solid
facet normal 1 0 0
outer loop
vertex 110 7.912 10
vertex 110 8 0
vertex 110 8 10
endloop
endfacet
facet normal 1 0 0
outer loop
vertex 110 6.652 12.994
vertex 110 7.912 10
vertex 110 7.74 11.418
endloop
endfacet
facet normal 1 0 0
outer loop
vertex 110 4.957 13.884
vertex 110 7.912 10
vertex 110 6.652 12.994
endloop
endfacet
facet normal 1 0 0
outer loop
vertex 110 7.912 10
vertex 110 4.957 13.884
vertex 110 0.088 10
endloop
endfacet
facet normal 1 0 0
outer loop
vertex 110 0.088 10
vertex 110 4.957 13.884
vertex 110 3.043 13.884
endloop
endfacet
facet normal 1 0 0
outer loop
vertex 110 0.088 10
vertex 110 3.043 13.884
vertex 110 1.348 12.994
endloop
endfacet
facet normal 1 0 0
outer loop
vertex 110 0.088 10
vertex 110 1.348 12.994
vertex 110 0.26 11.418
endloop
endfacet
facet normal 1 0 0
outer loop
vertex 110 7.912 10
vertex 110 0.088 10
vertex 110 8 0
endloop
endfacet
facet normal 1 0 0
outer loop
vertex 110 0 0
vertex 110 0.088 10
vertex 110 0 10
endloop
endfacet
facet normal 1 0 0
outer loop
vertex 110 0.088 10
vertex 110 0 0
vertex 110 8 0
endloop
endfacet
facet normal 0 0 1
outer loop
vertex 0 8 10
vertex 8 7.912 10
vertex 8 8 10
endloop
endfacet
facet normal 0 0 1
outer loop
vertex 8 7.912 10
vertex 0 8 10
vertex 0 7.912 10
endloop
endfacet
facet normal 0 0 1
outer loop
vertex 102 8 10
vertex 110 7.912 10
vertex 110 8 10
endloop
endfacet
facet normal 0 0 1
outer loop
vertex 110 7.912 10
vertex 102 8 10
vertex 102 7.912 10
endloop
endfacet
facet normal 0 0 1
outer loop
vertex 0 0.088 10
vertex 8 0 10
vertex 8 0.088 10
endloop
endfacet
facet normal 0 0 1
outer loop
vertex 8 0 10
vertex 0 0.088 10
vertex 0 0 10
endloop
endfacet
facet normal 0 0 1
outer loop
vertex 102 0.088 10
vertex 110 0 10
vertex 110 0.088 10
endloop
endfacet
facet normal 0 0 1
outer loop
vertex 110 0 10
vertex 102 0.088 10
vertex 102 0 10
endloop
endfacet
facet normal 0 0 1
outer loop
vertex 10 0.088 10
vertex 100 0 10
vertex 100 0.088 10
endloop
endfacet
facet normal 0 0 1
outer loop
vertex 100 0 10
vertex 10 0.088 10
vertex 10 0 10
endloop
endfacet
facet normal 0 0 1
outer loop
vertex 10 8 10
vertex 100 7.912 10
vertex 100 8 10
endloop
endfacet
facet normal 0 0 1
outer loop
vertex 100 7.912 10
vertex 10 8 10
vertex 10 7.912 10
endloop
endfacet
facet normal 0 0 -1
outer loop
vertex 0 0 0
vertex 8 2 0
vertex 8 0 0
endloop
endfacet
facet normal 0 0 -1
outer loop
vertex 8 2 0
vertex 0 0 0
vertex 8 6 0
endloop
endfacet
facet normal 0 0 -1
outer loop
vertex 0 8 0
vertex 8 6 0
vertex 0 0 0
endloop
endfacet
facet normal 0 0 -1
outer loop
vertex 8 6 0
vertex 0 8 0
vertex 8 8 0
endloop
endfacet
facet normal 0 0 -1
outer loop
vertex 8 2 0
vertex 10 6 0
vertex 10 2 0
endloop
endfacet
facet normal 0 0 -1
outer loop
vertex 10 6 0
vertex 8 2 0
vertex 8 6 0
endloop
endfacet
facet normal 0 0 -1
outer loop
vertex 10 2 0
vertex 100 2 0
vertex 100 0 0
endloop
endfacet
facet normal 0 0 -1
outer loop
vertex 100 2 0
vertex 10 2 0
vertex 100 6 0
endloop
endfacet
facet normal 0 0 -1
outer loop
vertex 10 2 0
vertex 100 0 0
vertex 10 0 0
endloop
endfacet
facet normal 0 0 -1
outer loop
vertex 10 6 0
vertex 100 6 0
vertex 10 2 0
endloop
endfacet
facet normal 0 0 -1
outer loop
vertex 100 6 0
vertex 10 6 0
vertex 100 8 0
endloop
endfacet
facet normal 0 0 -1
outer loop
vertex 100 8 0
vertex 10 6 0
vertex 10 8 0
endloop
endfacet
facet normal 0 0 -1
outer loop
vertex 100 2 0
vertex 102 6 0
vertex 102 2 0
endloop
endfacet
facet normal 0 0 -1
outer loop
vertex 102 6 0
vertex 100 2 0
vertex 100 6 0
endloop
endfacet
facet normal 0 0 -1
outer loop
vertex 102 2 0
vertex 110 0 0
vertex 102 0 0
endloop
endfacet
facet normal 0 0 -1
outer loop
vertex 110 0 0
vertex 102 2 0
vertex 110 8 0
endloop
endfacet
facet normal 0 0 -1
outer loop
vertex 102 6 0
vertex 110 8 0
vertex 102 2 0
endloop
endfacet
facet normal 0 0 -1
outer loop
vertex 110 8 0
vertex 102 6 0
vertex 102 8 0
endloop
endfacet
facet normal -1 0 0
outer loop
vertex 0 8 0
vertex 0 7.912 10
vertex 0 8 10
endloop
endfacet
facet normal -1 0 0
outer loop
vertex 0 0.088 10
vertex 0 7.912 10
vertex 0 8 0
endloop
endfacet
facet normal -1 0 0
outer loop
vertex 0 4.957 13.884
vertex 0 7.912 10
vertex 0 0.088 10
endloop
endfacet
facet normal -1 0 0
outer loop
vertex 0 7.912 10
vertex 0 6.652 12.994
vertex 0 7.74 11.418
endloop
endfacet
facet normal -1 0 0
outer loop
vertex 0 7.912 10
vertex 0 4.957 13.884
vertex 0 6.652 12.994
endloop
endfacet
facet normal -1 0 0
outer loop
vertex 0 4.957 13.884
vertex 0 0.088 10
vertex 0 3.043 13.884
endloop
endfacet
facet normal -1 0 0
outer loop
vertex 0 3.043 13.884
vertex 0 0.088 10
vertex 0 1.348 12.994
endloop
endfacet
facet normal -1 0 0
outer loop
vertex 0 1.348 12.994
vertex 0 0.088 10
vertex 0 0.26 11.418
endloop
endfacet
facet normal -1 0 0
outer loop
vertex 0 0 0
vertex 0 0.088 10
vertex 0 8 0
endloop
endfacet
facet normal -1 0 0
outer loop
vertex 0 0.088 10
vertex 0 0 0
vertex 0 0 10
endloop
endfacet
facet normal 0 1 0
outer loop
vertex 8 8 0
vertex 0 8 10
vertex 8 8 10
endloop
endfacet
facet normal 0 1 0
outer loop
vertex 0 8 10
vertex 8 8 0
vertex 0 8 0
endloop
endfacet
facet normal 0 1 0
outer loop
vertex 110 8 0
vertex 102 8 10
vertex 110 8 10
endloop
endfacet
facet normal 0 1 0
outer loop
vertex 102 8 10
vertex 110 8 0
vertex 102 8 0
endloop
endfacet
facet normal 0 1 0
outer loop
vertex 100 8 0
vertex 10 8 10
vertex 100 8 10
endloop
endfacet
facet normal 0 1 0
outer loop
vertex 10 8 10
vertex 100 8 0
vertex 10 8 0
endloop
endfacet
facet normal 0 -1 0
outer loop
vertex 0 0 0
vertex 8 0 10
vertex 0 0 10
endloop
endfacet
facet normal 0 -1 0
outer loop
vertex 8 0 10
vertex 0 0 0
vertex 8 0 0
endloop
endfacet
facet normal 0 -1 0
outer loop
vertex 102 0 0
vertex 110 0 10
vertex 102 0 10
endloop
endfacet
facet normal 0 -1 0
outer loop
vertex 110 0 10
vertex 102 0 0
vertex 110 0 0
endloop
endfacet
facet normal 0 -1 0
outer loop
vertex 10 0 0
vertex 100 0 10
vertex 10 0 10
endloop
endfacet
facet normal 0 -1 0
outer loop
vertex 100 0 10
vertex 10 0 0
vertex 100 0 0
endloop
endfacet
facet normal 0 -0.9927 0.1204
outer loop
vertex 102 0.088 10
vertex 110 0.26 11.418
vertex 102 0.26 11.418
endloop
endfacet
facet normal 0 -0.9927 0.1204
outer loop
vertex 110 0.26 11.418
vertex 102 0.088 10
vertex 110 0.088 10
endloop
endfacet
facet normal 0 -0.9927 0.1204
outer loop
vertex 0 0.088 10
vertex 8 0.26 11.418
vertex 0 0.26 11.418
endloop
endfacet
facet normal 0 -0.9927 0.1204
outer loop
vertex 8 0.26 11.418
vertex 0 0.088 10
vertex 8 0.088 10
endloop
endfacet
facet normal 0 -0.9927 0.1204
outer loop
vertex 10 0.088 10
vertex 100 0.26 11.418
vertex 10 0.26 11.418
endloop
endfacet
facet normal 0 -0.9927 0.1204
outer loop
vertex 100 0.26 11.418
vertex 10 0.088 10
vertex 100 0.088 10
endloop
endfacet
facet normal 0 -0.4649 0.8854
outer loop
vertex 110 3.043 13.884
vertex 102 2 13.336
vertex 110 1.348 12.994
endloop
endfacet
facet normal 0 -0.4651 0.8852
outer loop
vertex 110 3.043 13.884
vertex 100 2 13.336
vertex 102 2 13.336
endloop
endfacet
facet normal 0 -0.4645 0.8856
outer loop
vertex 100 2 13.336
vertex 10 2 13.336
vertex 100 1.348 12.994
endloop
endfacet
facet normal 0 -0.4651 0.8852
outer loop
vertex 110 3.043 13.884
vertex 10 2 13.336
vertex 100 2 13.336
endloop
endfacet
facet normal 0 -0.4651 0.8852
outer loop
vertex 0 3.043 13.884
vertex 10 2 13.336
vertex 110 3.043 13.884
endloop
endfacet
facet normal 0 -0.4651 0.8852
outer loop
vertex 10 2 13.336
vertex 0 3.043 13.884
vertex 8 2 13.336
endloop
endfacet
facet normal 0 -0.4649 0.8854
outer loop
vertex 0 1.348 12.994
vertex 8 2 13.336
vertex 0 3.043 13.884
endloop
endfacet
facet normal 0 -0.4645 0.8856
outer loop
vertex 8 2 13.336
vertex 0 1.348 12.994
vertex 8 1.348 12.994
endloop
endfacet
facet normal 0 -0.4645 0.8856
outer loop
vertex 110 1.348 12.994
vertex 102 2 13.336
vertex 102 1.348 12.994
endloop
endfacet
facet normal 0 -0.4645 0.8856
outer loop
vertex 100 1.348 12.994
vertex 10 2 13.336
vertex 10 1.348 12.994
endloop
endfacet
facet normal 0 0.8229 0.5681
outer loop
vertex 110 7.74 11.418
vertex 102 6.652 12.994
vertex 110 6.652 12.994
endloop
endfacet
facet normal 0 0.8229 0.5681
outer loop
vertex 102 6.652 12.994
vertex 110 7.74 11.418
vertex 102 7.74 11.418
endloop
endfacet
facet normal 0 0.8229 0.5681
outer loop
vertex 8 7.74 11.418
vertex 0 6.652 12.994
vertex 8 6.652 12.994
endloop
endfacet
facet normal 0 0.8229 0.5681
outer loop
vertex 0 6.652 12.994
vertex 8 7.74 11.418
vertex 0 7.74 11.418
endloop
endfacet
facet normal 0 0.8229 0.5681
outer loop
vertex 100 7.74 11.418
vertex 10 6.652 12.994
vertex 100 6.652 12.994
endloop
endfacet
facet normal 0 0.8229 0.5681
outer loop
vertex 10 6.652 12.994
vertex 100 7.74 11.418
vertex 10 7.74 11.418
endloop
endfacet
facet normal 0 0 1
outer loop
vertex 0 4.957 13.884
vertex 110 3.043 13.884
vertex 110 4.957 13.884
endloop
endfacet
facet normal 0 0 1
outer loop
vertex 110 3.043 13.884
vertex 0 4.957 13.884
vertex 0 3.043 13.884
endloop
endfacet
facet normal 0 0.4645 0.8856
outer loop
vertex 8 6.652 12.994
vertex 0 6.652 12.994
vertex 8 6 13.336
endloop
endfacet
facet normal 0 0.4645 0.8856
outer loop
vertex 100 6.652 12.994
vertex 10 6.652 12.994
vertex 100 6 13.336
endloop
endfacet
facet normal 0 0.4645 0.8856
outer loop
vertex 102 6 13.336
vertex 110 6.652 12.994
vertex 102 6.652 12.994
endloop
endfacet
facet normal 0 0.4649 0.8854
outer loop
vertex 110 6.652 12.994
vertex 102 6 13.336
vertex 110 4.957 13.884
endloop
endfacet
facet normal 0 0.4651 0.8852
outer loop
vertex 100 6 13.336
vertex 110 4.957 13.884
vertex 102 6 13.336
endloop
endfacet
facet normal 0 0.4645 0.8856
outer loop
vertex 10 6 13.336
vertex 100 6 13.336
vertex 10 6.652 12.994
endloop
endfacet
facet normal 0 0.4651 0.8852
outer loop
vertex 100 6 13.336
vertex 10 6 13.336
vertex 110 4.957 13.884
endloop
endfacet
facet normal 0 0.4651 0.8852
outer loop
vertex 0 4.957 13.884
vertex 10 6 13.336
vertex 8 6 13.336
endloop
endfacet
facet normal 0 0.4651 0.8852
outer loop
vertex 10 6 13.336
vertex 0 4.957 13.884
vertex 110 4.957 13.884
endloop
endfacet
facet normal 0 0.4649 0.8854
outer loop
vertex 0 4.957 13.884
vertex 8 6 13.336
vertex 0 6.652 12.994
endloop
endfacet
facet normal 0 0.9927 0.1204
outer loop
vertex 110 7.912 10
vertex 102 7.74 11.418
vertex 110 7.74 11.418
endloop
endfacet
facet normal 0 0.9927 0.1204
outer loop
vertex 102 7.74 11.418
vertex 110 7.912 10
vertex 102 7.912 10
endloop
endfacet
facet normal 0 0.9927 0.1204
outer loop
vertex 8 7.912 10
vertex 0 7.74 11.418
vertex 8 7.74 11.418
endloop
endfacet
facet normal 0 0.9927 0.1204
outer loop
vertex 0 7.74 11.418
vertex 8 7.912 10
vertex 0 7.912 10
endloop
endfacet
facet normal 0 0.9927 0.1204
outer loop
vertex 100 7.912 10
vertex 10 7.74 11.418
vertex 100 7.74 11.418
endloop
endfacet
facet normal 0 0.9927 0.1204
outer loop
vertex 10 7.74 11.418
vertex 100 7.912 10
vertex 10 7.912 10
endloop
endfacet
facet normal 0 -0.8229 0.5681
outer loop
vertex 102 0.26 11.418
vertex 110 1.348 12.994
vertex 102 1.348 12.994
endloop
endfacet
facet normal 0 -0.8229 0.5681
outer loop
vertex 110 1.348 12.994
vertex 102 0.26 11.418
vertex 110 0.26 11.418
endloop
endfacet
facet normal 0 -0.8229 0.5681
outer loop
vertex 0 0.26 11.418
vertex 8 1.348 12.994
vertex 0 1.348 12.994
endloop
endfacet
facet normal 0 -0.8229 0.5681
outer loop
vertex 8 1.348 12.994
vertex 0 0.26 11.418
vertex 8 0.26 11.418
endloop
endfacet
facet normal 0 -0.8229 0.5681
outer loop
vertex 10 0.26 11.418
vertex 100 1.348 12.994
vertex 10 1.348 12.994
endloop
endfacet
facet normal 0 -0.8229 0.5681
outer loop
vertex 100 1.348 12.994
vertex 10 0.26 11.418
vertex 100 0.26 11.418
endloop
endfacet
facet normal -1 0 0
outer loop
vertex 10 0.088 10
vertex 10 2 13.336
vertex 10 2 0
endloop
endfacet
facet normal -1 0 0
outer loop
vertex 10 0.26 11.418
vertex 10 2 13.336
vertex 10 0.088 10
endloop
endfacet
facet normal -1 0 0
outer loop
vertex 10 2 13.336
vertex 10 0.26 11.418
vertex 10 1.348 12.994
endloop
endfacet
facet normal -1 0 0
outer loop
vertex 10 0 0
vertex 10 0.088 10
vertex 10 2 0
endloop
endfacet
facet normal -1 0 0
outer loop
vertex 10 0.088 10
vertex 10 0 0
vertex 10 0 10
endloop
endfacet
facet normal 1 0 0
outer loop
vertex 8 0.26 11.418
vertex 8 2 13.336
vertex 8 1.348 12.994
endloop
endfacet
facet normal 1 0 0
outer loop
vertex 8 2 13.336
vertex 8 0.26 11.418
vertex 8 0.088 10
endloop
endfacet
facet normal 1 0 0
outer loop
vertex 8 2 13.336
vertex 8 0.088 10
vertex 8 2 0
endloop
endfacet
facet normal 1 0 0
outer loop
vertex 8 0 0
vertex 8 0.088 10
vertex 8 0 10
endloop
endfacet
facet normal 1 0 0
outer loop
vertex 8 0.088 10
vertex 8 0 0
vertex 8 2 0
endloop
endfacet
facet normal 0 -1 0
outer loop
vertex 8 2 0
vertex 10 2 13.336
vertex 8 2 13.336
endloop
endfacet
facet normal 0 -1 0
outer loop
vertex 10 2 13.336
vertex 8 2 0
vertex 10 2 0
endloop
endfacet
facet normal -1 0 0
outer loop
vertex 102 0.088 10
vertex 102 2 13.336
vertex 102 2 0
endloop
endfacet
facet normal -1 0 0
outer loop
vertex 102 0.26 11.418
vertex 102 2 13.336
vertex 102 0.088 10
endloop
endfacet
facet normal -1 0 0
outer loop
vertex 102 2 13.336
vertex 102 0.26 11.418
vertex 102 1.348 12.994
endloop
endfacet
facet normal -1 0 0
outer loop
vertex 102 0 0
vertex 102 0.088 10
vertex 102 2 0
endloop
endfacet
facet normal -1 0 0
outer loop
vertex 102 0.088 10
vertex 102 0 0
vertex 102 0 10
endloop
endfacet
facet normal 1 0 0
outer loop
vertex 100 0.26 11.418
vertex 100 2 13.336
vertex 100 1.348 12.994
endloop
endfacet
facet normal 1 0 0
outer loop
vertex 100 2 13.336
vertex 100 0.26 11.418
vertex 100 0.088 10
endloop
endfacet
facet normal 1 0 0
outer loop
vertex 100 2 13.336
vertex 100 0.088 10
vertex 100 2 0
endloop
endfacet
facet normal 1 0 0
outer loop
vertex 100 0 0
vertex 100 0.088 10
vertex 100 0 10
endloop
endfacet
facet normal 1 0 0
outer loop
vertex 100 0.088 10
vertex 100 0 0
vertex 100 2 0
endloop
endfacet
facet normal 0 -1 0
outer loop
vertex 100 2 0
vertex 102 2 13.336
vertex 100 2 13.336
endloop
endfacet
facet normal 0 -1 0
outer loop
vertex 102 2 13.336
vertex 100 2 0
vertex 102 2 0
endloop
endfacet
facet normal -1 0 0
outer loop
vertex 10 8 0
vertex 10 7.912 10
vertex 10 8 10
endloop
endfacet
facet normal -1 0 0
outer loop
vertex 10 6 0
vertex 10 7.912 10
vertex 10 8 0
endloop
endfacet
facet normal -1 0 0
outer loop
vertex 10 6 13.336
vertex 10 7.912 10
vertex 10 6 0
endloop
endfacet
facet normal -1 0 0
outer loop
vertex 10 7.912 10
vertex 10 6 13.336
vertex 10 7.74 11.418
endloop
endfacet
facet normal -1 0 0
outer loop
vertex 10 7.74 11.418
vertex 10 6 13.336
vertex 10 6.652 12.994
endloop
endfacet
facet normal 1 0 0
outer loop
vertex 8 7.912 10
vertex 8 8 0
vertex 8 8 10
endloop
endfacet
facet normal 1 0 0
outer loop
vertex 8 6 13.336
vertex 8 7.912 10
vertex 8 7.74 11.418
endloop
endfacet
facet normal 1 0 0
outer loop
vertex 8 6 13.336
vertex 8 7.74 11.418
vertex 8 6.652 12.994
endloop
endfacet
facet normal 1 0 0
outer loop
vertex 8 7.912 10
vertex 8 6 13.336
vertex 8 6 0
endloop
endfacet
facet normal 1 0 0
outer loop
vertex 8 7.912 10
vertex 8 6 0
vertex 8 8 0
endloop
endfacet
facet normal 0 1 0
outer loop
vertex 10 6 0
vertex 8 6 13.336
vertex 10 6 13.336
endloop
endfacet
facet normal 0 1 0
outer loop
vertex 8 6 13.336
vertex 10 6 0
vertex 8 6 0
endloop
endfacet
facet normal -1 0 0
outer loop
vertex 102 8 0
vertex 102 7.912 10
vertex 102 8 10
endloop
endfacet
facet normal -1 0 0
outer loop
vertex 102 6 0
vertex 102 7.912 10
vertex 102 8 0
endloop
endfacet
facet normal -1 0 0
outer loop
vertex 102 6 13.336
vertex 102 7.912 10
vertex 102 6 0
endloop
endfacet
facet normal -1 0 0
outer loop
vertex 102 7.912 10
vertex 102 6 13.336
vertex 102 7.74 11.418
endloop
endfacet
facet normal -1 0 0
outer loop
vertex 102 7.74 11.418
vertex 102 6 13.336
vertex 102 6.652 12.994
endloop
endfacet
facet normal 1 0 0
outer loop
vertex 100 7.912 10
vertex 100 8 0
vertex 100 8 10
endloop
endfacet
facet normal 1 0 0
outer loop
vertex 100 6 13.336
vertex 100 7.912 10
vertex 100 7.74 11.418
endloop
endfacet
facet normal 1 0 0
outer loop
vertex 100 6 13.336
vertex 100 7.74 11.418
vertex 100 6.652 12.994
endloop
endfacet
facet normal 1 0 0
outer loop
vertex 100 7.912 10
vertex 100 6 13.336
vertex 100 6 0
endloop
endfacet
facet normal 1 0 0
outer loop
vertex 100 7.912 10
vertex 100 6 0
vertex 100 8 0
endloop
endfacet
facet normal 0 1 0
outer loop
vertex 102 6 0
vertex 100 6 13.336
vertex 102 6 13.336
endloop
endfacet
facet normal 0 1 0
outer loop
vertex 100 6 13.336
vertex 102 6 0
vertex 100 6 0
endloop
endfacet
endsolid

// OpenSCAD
// Configurator variables

// length of the bar in mm.
bar_length = 110;

// End of configurator variables

/* [Hidden] */

bar_height = 10;
bar_width = 8;
difference()
{
  union()
  {
    cube([bar_length, bar_width, bar_height]);
    translate([0, bar_width/2, bar_height]) rotate([0,90,0]) cylinder(d=bar_width, h=bar_length);
  }
  translate([8,0,0])
    cube([2,2,bar_height+bar_width]);
  translate([bar_length-10,0,0])
    cube([2,2,bar_height+bar_width]);
  translate([8,bar_width-2,0])
    cube([2,2,bar_height+bar_width]);
  translate([bar_length-10,bar_width-2,0])
    cube([2,2,bar_height+bar_width]);
}
